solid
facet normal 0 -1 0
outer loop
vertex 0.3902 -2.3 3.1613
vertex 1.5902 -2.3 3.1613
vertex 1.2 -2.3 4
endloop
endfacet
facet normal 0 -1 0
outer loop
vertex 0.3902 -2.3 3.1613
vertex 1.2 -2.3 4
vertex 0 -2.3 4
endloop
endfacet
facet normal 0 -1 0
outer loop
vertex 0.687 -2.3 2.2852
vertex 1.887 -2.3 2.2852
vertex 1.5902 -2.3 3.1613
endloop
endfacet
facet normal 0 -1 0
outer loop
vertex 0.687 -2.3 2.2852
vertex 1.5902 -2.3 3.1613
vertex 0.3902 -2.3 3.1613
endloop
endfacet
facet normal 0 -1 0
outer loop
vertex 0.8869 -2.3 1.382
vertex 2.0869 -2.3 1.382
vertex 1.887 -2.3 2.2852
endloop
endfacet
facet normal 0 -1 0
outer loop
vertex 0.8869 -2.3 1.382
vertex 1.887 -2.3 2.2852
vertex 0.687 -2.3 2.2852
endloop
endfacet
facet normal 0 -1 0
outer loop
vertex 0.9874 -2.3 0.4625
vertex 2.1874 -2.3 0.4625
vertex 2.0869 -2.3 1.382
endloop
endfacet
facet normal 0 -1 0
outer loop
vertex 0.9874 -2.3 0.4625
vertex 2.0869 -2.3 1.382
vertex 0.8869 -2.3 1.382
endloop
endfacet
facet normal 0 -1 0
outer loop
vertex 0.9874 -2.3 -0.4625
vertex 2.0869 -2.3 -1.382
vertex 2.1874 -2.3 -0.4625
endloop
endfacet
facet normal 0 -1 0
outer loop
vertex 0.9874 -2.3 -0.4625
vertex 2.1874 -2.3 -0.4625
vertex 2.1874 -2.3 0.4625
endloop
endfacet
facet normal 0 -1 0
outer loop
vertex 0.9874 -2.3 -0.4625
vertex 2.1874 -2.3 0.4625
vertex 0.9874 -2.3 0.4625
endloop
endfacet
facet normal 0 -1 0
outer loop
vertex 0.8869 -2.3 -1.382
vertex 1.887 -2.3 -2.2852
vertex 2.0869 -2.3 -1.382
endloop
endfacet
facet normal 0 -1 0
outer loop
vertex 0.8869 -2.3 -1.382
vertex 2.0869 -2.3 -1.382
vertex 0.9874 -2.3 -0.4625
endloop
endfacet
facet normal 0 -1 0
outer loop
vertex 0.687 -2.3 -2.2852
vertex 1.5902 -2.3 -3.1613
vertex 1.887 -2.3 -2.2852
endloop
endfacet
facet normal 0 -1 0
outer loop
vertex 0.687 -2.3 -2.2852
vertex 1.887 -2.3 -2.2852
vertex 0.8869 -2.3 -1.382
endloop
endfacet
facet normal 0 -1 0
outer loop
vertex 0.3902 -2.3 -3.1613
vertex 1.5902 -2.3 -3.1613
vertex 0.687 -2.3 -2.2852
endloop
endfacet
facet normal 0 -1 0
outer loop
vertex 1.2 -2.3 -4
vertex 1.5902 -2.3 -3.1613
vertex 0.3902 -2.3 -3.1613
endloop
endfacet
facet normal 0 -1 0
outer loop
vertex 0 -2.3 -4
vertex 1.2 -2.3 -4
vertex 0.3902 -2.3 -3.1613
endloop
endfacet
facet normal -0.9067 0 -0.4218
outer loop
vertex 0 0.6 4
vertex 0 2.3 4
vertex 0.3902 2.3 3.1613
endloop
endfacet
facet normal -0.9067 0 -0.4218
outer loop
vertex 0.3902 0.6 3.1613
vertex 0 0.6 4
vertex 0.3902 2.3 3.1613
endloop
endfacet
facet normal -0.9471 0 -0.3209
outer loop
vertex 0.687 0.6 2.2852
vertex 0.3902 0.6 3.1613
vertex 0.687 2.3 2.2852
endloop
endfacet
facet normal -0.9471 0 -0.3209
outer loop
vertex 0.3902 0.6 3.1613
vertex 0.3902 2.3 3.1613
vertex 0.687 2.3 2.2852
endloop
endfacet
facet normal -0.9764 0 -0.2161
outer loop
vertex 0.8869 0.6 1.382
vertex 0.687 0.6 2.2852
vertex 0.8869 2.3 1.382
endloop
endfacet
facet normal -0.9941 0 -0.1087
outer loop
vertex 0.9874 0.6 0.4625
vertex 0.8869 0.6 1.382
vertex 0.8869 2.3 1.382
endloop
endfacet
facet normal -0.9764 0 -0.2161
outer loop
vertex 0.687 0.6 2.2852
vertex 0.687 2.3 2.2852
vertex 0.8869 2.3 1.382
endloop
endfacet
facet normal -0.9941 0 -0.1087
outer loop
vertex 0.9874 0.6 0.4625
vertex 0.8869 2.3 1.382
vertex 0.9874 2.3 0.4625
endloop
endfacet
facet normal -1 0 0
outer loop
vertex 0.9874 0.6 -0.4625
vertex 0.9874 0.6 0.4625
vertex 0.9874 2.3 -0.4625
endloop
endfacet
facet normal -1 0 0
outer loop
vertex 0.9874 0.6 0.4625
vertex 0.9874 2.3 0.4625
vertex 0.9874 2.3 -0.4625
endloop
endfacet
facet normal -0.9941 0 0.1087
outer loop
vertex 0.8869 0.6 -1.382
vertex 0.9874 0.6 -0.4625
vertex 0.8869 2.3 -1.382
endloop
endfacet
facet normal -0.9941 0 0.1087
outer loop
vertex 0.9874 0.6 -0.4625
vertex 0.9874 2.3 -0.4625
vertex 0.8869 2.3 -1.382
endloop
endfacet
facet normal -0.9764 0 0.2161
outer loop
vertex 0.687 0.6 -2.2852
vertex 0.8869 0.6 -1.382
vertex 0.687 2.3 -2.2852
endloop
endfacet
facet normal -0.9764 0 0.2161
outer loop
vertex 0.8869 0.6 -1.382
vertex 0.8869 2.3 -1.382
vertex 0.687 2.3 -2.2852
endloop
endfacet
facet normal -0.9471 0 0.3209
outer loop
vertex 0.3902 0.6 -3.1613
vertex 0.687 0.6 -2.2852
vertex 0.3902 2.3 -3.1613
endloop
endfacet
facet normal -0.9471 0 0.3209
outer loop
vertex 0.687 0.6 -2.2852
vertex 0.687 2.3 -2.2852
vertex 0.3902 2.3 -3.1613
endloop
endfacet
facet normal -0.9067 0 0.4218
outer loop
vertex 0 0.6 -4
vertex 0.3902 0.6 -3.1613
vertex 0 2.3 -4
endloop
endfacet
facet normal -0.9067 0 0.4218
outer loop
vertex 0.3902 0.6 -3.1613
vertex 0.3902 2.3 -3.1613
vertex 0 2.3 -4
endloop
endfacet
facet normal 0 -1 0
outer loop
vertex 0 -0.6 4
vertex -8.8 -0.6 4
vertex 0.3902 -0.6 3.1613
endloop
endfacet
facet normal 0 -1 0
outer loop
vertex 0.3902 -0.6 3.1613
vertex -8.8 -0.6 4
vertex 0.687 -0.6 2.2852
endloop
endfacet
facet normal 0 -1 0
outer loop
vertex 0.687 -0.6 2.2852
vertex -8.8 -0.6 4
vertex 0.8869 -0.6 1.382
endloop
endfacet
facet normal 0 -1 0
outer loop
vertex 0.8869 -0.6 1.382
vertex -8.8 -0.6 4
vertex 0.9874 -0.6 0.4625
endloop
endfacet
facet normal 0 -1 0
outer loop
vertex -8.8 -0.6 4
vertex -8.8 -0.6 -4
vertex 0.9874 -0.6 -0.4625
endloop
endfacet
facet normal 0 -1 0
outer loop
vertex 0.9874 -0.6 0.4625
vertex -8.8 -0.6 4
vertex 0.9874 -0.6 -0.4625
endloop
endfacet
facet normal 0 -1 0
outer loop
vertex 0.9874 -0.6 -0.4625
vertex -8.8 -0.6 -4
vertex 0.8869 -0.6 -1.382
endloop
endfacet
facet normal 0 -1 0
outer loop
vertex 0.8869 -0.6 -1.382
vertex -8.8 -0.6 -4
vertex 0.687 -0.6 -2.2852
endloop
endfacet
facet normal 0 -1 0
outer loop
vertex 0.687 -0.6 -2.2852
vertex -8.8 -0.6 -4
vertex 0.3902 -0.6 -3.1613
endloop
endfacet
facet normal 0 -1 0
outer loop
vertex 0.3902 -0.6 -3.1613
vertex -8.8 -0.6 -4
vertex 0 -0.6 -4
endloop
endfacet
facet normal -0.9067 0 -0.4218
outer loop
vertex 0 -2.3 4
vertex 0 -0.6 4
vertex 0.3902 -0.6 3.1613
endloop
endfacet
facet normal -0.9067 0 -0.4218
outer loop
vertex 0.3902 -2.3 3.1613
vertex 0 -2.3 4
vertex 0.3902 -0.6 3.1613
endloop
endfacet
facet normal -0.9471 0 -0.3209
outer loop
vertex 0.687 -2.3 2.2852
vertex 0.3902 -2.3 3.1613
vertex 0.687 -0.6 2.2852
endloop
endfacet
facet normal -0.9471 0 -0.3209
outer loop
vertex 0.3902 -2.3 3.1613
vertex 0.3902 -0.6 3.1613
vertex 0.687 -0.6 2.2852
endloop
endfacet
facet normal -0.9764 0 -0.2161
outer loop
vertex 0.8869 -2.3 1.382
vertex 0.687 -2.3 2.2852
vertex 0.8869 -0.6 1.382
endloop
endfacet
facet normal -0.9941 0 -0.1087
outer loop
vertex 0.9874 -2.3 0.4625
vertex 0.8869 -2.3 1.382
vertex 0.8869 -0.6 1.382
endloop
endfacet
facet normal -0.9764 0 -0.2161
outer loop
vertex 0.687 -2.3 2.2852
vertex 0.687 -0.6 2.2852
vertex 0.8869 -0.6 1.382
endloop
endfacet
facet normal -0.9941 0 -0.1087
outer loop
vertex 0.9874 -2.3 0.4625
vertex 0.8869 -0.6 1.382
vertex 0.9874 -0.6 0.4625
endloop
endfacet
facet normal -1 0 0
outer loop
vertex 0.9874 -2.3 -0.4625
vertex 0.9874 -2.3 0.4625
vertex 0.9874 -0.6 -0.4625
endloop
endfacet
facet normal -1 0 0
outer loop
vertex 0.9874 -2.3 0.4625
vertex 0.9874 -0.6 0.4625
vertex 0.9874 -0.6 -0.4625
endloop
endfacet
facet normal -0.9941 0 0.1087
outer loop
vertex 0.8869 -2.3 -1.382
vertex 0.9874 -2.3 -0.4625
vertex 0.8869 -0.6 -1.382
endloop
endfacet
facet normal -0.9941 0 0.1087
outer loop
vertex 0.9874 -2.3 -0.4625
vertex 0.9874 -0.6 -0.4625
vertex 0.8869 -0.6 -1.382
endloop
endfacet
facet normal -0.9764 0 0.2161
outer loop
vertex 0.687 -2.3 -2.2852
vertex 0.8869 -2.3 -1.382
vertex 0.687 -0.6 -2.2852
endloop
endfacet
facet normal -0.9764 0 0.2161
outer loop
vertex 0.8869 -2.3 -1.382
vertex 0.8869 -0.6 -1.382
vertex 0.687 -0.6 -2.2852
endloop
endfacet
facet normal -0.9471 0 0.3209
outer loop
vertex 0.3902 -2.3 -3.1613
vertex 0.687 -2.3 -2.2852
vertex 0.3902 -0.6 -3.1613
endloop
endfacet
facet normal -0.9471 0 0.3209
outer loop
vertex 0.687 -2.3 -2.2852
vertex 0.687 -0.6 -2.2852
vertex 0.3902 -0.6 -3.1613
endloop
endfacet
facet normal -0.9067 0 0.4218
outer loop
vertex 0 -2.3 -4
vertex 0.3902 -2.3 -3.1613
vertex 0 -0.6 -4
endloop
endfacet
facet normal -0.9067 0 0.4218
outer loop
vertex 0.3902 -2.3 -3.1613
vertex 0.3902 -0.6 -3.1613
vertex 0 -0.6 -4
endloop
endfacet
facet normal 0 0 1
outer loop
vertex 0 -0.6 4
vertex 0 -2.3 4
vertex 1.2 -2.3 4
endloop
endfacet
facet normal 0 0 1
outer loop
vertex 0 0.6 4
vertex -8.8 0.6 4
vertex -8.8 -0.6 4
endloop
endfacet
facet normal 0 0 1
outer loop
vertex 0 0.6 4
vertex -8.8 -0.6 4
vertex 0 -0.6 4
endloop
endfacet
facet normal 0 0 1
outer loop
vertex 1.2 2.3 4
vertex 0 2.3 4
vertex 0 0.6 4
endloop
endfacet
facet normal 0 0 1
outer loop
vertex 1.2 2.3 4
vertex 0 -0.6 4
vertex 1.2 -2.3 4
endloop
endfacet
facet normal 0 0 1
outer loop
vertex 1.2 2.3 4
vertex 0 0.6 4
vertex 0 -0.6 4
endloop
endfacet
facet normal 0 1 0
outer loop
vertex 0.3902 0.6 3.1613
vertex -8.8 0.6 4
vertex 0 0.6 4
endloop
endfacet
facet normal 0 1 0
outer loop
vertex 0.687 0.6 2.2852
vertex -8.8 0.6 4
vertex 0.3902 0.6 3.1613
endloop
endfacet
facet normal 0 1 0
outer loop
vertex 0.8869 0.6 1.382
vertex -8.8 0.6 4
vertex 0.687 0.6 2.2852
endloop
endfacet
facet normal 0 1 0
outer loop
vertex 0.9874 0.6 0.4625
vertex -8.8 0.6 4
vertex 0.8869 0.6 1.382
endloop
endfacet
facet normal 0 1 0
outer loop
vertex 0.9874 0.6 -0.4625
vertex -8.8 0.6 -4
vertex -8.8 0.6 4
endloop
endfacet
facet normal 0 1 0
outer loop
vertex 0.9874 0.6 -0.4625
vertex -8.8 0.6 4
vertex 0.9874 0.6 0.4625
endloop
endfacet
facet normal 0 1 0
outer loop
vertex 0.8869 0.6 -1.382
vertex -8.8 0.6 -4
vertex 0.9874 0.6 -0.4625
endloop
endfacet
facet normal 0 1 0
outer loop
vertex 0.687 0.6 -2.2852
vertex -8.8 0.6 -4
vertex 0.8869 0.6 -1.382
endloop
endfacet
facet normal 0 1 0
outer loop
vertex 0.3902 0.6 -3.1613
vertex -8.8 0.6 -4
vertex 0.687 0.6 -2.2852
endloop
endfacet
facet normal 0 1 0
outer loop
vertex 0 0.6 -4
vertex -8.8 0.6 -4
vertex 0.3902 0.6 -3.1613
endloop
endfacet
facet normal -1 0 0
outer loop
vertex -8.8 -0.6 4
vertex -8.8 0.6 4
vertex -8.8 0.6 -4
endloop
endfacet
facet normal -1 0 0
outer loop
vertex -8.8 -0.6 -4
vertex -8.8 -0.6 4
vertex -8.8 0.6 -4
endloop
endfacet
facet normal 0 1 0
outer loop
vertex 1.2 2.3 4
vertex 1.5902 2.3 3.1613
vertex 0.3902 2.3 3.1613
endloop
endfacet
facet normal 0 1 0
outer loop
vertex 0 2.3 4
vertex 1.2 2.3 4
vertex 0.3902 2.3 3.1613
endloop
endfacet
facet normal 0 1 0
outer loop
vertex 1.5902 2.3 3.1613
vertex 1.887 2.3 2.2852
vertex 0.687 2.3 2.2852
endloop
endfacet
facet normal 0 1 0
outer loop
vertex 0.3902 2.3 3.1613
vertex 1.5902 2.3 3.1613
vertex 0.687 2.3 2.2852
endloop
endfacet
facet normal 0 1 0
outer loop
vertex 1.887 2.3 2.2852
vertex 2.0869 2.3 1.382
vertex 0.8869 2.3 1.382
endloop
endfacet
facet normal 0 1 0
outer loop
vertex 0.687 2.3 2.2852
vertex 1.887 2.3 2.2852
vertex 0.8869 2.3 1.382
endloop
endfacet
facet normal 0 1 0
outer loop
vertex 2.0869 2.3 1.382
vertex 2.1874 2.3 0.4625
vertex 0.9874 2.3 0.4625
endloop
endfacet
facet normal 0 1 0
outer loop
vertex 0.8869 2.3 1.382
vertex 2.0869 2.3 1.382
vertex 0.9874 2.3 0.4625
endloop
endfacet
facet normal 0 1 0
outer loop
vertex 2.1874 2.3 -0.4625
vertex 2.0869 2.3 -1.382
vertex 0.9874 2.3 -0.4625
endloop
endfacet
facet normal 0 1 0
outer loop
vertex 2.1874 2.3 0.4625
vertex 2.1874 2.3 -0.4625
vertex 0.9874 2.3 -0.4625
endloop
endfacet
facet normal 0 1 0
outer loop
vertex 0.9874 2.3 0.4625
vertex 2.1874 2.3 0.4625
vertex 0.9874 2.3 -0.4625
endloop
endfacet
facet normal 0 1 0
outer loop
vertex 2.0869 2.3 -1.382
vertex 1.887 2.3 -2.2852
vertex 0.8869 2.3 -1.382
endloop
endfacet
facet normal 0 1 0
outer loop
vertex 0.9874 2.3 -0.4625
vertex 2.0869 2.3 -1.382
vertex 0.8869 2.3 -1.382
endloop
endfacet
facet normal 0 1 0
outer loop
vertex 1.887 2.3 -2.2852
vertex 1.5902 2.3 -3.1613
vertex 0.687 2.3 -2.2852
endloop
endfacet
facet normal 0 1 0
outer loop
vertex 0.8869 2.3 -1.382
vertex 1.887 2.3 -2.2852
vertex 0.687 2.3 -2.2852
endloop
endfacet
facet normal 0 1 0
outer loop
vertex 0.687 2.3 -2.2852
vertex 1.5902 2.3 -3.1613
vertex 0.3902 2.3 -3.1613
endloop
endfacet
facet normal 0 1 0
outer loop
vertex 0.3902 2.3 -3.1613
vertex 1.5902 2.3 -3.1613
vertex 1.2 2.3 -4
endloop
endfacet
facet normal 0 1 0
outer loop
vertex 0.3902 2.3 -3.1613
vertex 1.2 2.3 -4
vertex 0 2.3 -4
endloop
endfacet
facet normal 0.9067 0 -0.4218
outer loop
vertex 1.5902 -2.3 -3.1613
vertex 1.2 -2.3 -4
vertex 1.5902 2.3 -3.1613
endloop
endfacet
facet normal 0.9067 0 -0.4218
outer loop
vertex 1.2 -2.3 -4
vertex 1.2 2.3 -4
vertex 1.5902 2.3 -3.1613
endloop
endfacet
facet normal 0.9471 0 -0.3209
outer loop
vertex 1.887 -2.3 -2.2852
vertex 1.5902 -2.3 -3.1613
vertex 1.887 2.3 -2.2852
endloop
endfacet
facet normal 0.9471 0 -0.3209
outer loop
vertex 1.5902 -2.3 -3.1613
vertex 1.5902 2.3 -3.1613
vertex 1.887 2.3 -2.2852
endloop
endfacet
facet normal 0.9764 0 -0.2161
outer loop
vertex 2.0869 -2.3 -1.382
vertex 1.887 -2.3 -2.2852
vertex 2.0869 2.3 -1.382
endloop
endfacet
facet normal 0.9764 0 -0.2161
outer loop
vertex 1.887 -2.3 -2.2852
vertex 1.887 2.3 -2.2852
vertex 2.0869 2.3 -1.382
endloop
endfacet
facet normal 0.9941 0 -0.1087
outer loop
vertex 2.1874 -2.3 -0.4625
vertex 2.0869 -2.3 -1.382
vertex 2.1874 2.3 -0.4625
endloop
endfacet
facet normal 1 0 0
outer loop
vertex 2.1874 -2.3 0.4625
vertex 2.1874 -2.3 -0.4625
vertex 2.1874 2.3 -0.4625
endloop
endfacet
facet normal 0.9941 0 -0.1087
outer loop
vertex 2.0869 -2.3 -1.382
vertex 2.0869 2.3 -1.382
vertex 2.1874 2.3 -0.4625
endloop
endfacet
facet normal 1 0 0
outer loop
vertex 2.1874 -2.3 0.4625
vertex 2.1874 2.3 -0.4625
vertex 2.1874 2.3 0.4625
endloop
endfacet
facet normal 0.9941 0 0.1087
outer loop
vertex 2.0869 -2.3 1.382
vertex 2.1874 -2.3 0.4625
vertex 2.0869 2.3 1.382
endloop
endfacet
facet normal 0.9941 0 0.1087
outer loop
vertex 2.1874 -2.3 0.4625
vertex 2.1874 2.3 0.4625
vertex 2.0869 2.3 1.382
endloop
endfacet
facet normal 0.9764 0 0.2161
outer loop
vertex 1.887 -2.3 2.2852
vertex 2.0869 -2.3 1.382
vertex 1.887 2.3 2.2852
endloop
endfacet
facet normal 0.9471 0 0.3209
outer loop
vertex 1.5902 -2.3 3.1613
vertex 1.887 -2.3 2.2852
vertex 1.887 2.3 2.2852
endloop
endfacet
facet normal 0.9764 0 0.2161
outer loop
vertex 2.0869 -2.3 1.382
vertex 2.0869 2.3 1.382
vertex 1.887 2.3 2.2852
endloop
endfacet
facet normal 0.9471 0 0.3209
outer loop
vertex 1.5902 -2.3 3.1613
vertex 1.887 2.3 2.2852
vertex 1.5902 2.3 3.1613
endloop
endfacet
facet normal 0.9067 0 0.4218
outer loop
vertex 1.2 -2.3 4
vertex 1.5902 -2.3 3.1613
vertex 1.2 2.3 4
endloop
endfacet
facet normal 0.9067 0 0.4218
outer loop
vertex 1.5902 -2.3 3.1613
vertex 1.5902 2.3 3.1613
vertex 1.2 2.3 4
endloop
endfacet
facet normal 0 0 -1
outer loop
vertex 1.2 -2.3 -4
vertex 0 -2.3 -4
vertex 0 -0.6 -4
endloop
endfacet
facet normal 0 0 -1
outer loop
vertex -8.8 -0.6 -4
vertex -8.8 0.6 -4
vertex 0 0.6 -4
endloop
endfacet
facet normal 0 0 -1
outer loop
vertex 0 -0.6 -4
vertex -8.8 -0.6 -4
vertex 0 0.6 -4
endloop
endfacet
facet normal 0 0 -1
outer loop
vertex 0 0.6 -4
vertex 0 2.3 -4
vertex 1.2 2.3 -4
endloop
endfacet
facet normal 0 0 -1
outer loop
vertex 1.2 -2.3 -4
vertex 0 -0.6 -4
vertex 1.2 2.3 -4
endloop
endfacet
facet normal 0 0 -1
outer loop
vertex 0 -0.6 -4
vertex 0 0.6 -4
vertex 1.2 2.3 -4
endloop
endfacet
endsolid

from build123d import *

# Parameters (mm, degrees)
BOSS_EXTRUDE1_DEPTH = 2.3
SKETCH3_W           = 10
SKETCH3_H           = 8
BOSS_EXTRUDE2_DEPTH = 0.6


with BuildPart() as part:
    # Sketch2 → Boss-Extrude1 (new body, symmetric)
    with BuildSketch(Plane(origin=(0, 0, 0), x_dir=(1, 0, 0), z_dir=(0, 1, 0))):
        with BuildLine():
            Line((0, 4), (1.2, 4))
            ThreePointArc((1.2, 4), (2.2, 0), (1.2, -4))
            Line((1.2, -4), (0, -4))
            ThreePointArc((0, -4), (1, 0), (0, 4))
        make_face()
    extrude(amount=BOSS_EXTRUDE1_DEPTH, both=True)

    # Sketch3 → Boss-Extrude2 (add, symmetric)
    with BuildSketch(Plane(origin=(0, 0, 0), x_dir=(1, 0, 0), z_dir=(0, 1, 0))):
        with Locations((-3.8, 0)):
            Rectangle(SKETCH3_W, SKETCH3_H)
    extrude(amount=BOSS_EXTRUDE2_DEPTH, both=True)


solid = part.part
